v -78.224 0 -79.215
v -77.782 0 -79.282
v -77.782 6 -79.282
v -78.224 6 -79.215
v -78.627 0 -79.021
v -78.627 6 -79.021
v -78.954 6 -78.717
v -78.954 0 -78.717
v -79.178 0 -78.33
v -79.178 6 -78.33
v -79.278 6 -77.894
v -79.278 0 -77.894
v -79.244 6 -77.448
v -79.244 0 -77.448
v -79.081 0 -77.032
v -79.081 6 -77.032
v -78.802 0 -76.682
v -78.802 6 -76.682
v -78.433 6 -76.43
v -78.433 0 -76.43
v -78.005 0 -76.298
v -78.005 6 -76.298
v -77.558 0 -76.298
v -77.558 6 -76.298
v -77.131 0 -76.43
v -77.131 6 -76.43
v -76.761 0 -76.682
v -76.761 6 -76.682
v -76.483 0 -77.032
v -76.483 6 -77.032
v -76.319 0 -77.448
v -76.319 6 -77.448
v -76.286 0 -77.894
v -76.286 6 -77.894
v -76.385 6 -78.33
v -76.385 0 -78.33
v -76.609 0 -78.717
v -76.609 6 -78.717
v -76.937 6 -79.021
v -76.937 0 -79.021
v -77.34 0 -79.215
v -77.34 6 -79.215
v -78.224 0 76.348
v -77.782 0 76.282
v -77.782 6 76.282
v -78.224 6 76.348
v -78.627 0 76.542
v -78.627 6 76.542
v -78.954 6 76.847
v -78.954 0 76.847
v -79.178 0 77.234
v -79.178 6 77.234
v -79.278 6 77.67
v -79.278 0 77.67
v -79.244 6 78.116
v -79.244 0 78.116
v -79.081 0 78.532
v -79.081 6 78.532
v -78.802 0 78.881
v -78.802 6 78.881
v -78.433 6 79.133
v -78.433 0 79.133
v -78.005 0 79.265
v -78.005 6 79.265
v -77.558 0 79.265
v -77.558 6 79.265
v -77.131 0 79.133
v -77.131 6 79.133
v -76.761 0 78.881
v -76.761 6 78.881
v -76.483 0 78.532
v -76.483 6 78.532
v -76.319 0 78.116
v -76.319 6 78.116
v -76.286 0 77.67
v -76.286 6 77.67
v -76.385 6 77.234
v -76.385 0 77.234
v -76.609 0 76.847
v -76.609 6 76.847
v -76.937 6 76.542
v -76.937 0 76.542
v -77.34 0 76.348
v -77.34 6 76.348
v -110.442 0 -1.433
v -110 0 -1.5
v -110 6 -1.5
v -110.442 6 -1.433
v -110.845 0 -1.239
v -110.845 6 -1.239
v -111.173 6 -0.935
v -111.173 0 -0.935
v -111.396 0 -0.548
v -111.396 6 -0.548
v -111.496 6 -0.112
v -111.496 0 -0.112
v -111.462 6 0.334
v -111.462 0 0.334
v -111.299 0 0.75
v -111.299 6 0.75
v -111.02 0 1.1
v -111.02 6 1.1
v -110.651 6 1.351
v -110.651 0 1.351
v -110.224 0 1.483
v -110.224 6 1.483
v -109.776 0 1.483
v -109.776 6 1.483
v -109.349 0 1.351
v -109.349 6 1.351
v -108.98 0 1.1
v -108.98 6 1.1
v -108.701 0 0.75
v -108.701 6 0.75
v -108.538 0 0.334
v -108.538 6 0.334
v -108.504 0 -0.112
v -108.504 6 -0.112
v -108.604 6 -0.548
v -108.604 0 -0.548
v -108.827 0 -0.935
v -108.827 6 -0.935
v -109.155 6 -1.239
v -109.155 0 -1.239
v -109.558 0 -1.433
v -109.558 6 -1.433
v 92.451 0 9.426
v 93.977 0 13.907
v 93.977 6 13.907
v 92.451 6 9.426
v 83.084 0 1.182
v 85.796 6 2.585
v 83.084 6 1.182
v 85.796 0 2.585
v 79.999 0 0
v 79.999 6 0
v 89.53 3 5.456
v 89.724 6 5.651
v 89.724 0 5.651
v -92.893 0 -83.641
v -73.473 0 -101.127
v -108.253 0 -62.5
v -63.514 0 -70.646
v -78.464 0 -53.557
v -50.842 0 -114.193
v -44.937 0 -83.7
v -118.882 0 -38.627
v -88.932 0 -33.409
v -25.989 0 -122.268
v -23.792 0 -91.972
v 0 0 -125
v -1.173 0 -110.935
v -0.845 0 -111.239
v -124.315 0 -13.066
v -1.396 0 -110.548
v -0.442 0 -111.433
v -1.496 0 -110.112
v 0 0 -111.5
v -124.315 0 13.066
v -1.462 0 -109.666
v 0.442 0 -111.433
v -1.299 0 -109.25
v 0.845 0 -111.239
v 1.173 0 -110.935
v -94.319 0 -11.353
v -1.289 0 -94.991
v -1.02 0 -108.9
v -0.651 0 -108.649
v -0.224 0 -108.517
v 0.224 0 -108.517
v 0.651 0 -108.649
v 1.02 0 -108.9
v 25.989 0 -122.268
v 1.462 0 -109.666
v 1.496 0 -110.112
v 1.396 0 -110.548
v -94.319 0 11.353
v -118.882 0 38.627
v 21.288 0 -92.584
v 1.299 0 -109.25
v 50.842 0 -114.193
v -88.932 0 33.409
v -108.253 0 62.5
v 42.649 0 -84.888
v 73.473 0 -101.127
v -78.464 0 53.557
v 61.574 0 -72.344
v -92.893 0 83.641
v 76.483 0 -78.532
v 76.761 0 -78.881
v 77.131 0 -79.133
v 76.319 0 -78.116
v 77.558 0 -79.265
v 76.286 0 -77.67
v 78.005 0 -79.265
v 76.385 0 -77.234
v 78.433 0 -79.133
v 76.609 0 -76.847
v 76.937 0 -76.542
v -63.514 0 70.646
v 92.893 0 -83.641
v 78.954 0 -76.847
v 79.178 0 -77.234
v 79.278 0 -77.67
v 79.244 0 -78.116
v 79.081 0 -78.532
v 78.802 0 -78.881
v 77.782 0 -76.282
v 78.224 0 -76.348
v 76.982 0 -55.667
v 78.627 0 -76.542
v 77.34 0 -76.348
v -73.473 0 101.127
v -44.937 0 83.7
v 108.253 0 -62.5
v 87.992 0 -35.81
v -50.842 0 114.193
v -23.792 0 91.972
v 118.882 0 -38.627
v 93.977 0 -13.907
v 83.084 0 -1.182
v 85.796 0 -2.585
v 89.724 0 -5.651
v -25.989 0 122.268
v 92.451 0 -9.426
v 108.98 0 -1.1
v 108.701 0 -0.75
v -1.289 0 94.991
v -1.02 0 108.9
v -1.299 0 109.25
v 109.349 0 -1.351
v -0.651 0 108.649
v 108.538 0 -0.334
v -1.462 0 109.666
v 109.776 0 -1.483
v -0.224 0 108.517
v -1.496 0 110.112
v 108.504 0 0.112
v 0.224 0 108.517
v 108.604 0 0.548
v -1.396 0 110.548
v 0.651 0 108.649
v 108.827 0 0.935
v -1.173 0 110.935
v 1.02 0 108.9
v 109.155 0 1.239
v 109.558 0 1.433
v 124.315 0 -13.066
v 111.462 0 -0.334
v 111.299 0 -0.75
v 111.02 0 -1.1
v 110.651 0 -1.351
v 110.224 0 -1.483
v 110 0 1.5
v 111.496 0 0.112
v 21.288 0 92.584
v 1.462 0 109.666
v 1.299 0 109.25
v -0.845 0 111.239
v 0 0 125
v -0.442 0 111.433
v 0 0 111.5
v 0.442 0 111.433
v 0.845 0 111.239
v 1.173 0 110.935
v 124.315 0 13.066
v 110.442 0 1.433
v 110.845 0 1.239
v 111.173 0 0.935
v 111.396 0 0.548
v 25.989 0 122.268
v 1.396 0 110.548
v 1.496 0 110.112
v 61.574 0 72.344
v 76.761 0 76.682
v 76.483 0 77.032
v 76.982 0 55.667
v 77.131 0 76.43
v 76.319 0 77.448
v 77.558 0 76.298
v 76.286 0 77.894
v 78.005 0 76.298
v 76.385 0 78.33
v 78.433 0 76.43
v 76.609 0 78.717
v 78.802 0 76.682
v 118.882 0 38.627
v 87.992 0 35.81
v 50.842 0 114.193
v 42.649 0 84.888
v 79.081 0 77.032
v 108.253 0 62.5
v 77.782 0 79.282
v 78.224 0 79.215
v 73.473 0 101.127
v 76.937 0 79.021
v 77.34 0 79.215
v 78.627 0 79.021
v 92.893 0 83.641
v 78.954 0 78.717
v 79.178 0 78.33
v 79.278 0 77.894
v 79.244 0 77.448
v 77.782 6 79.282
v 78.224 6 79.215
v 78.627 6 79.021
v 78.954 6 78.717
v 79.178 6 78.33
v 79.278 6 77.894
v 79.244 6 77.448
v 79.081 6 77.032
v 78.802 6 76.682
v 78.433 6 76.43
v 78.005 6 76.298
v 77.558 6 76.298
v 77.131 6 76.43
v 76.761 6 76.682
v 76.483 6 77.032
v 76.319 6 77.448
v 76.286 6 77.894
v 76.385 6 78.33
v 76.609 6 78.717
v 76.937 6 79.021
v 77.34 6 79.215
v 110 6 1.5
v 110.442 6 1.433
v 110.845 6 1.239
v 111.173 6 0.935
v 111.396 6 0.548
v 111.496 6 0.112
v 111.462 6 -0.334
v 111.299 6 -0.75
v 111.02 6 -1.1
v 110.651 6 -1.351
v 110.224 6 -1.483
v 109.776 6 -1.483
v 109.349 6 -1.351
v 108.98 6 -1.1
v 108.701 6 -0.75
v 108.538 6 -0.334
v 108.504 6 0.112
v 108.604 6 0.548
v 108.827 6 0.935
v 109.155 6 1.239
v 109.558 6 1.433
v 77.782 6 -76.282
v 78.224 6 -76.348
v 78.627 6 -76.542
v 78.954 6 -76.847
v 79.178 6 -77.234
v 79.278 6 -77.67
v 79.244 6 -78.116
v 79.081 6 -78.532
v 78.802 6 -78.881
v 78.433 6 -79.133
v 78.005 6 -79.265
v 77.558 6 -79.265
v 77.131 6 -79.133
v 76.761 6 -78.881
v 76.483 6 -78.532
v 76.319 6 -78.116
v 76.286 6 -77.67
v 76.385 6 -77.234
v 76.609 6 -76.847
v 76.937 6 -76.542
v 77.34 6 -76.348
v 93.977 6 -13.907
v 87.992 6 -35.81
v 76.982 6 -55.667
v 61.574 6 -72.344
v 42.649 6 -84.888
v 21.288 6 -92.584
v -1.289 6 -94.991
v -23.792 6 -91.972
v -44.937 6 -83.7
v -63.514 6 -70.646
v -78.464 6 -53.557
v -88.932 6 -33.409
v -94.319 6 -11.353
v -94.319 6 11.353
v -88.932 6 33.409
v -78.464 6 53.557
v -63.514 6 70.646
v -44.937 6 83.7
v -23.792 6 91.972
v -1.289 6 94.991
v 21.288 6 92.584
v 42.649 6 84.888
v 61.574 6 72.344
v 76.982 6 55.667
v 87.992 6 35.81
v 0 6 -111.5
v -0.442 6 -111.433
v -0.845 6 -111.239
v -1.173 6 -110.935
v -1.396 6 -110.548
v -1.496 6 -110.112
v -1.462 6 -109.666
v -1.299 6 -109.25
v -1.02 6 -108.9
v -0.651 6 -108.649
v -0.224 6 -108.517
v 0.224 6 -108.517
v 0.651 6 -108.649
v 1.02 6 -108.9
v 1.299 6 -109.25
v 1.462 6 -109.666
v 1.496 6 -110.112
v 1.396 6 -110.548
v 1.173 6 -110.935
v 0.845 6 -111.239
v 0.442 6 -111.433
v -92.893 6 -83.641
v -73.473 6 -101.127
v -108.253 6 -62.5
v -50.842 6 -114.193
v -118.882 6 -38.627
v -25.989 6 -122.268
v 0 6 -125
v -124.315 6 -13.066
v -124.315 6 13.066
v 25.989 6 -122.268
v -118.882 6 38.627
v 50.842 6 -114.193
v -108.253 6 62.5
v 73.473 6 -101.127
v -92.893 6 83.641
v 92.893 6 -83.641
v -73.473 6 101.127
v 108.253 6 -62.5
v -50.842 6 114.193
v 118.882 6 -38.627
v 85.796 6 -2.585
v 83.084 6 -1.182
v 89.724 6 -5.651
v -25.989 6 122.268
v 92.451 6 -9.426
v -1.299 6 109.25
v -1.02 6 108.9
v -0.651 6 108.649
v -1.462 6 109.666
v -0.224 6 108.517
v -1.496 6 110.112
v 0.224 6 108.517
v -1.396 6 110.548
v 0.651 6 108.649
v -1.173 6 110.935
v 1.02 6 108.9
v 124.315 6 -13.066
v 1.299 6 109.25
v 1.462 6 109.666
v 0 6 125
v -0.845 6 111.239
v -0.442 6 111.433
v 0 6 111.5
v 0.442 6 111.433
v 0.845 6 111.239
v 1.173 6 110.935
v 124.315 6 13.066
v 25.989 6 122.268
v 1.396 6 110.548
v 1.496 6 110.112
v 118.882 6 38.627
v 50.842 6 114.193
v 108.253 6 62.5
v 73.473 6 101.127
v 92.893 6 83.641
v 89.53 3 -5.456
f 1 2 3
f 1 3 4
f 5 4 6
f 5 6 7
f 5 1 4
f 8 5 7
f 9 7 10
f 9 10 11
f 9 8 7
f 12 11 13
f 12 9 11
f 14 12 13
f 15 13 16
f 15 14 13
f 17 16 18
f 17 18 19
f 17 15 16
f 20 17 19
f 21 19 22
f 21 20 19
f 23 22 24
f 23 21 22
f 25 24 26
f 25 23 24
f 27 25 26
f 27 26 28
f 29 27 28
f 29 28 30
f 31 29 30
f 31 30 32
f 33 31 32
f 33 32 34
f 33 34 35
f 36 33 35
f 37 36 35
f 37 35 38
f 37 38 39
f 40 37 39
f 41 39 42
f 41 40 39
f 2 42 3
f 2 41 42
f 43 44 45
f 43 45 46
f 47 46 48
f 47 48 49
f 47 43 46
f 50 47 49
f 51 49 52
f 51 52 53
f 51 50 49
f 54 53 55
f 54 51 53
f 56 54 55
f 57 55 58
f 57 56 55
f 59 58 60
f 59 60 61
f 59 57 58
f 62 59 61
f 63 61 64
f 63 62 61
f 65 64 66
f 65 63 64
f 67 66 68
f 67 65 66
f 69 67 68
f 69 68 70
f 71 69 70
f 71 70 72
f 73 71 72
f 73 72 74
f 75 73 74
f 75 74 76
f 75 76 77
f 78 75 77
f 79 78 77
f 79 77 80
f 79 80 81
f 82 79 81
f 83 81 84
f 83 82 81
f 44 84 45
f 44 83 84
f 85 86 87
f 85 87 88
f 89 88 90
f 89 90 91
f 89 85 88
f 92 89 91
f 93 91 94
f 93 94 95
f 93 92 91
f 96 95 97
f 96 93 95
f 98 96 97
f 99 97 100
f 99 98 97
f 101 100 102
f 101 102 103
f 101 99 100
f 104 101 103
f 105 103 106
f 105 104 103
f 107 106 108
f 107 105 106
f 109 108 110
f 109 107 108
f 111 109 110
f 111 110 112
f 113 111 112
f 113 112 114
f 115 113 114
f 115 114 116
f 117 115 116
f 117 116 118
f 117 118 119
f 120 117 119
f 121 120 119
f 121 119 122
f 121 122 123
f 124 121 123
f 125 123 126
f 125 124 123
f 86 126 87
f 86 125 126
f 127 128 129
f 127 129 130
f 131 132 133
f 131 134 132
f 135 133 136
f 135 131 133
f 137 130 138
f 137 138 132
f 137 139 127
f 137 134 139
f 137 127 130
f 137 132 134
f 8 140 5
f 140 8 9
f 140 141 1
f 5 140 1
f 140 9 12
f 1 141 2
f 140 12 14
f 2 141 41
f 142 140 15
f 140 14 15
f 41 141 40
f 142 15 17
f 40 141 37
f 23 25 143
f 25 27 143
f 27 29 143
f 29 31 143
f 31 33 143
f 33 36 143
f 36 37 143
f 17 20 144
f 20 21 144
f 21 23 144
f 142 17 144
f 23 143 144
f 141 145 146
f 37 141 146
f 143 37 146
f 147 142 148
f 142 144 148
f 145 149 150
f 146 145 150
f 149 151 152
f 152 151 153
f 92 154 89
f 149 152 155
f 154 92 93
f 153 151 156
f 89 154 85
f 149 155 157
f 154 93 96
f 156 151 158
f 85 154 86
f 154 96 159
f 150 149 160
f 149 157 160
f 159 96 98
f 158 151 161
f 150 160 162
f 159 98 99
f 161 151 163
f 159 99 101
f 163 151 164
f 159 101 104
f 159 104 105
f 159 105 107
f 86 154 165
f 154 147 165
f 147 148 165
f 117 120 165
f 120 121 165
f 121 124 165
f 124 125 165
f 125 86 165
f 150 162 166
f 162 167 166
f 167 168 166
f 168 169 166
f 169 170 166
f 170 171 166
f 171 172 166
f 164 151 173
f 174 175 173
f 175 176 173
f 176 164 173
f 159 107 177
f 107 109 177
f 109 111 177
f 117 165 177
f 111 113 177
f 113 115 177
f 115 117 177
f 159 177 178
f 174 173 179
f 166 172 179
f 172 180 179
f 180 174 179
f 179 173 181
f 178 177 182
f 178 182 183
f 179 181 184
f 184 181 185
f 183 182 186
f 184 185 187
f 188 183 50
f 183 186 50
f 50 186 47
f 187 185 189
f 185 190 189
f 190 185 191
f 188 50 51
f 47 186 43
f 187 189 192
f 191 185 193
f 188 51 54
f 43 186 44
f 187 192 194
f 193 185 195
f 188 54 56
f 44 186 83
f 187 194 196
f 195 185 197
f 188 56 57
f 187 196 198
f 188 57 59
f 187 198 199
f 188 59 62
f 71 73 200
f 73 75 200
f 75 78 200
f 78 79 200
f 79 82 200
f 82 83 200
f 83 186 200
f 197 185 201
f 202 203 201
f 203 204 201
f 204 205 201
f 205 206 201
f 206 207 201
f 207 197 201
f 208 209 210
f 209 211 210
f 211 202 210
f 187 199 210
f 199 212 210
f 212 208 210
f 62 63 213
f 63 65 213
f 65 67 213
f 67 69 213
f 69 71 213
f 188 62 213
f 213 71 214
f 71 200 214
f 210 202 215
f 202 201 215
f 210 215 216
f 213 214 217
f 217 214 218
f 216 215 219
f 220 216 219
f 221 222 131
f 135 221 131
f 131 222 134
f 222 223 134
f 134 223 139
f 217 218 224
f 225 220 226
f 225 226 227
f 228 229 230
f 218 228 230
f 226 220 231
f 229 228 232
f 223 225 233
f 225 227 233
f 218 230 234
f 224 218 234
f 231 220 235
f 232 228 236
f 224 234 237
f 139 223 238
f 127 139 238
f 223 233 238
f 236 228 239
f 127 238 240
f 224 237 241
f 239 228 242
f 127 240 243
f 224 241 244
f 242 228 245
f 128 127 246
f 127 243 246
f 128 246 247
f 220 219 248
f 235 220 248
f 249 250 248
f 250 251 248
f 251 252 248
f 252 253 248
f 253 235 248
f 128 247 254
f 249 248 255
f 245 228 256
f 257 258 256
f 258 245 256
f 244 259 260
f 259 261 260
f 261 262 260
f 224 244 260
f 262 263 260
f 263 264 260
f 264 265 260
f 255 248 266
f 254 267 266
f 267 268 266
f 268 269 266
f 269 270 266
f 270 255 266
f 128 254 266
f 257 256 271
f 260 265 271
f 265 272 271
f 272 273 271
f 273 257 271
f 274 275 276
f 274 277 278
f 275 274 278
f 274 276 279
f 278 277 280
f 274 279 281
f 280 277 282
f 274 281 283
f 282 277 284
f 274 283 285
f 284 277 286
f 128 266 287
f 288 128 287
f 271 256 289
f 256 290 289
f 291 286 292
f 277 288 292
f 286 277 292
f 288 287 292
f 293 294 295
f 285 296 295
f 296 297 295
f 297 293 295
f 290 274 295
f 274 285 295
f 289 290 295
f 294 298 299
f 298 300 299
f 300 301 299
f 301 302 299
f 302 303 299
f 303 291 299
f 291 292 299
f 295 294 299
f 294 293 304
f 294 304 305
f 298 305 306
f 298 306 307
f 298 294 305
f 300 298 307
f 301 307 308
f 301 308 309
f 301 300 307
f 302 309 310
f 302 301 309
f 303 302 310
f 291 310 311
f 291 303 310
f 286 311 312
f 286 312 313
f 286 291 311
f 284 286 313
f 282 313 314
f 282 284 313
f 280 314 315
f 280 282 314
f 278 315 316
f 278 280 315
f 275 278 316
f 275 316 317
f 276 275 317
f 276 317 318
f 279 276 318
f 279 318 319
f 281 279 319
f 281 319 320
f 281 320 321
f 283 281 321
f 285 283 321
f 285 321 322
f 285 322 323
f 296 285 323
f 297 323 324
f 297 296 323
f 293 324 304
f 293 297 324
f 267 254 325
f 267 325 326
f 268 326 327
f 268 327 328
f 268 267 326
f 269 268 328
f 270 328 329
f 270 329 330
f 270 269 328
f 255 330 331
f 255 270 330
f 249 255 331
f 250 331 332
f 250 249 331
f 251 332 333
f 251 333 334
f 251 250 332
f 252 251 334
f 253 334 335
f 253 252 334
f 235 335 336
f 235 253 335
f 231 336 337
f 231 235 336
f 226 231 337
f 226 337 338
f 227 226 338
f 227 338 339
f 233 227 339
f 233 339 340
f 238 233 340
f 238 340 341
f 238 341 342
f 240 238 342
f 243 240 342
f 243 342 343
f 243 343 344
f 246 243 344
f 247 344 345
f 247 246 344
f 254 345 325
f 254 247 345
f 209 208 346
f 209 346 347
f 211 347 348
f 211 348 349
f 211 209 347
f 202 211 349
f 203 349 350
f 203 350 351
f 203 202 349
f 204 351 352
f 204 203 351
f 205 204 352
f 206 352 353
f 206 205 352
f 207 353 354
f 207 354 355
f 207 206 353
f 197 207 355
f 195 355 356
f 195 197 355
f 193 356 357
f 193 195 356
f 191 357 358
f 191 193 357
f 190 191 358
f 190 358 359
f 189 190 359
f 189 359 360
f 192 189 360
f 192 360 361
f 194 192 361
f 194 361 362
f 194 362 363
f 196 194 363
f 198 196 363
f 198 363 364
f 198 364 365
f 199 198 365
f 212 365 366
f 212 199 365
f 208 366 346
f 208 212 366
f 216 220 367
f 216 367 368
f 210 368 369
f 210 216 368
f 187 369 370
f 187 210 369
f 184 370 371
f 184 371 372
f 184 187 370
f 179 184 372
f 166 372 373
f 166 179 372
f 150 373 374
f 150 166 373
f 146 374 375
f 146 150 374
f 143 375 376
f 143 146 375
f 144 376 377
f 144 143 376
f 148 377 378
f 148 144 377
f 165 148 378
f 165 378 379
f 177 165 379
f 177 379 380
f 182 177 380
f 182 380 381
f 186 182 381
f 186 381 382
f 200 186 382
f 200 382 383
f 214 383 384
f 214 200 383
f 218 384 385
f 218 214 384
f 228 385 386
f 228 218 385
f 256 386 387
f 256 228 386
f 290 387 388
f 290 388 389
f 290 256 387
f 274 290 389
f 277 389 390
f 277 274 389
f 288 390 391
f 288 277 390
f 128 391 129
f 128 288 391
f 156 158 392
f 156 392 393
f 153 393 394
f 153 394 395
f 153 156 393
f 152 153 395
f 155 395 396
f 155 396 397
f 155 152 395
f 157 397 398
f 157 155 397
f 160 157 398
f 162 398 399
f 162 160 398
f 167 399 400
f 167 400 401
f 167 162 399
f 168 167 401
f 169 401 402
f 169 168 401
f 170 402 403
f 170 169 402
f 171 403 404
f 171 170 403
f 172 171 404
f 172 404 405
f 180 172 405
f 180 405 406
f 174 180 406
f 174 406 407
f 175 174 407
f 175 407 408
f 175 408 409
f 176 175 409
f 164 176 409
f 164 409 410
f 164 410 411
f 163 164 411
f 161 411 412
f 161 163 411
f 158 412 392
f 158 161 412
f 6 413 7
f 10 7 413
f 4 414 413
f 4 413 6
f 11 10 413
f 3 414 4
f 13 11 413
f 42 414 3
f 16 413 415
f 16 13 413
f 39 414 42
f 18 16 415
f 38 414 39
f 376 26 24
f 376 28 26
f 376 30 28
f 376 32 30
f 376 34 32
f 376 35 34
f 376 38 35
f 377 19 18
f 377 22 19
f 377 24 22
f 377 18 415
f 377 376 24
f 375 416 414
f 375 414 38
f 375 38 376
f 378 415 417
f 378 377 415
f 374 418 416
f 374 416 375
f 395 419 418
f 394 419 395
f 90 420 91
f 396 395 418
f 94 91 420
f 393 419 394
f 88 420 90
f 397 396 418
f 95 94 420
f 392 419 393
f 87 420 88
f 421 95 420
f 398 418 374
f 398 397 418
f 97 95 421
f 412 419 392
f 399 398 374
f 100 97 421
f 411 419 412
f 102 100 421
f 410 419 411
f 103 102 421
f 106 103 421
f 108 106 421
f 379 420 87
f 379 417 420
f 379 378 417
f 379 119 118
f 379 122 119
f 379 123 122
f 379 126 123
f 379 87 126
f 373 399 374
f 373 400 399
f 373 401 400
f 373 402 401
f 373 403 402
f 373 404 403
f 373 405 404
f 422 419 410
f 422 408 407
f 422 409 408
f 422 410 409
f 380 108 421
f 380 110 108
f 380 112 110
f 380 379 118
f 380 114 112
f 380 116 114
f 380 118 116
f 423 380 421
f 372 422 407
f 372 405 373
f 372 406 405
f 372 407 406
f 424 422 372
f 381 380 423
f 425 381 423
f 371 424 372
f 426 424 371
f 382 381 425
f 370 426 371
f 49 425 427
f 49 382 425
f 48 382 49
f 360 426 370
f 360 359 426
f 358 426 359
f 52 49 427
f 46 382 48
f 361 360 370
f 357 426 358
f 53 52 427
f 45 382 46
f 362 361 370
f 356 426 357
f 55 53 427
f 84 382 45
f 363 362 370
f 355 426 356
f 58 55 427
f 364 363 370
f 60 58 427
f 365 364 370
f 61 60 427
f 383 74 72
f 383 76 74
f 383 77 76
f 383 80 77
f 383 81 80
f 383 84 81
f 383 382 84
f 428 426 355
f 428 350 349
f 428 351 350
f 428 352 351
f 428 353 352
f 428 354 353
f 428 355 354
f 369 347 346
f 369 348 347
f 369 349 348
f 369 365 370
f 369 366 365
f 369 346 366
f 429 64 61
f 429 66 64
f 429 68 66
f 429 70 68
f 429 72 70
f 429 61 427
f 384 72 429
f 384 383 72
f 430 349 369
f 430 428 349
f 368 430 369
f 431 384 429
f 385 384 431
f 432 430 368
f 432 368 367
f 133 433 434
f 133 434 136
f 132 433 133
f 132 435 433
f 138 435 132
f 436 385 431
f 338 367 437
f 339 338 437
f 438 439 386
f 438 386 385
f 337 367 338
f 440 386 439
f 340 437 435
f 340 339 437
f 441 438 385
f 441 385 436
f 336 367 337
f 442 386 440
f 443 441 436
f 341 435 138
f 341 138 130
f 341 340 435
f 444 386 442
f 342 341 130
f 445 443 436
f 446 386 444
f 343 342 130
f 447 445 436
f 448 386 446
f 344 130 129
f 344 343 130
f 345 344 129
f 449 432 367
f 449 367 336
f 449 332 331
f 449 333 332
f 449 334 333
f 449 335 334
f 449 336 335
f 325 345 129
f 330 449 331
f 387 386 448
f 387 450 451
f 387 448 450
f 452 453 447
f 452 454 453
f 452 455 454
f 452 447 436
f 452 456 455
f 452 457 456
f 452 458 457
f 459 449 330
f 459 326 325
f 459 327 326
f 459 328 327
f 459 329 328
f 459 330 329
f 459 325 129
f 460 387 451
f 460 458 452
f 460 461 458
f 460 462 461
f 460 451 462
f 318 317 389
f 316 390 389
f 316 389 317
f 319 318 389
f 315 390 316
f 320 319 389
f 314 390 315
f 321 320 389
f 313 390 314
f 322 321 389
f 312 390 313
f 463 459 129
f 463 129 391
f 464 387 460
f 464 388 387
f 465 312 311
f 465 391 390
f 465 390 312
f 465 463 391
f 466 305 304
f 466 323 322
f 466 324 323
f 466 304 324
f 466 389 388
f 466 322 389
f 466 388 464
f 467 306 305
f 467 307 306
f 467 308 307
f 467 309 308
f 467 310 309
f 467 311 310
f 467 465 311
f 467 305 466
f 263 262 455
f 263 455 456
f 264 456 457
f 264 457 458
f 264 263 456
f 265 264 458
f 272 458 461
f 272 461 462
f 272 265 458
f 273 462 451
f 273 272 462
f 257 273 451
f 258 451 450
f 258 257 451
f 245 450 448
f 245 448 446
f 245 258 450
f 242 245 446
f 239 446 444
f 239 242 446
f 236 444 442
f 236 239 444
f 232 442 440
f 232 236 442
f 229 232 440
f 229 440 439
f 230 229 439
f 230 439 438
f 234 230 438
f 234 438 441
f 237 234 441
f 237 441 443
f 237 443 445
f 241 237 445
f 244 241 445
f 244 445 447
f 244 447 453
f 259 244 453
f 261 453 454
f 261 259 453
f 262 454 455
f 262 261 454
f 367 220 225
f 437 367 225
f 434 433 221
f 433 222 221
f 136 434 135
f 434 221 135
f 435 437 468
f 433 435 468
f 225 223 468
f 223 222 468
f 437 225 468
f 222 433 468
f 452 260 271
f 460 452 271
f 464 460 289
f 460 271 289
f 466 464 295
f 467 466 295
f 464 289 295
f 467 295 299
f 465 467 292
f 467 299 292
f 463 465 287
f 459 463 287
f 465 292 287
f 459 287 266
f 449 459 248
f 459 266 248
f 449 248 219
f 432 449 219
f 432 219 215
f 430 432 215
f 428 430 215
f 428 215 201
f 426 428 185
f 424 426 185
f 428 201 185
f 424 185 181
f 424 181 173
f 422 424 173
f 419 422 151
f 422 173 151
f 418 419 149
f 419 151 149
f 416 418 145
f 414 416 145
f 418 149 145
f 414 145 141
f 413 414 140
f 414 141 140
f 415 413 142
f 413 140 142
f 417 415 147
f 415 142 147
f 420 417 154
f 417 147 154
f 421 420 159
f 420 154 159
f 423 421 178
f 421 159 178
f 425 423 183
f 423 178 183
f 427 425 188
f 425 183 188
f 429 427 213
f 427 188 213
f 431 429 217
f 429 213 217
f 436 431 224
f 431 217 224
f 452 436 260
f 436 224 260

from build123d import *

# Parameters (mm, degrees)
SKETCH1_R           = 125
SKETCH1_R_2         = 1.5
BOSS_EXTRUDE1_DEPTH = 6


with BuildPart() as part:
    # Sketch1 → Boss-Extrude1 (new body)
    with BuildSketch(Plane(origin=(0, 0, 0), x_dir=(1, 0, 0), z_dir=(0, 1, 0))):
        Circle(SKETCH1_R)
        with Locations((0, -110)):
            Circle(SKETCH1_R_2, mode=Mode.SUBTRACT)
        with Locations((77.781745931, -77.781745931)):
            Circle(SKETCH1_R_2, mode=Mode.SUBTRACT)
        with Locations((110, 0)):
            Circle(SKETCH1_R_2, mode=Mode.SUBTRACT)
        with Locations((77.781745931, 77.781745931)):
            Circle(SKETCH1_R_2, mode=Mode.SUBTRACT)
        with Locations((0, 110)):
            Circle(SKETCH1_R_2, mode=Mode.SUBTRACT)
        with Locations((-77.781745931, 77.781745931)):
            Circle(SKETCH1_R_2, mode=Mode.SUBTRACT)
        with Locations((-110, 0)):
            Circle(SKETCH1_R_2, mode=Mode.SUBTRACT)
        with Locations((-77.781745931, -77.781745931)):
            Circle(SKETCH1_R_2, mode=Mode.SUBTRACT)
        with BuildLine():
            ThreePointArc((93.976500469, 13.907456977), (-95, 0), (93.976500469, -13.907456977))
            add(Edge.make_bspline(
                [(93.976500469, -13.907456977), (92.072801417, -3.957394346), (79.998651047, 0)],
                knots=[0, 0, 0, 1, 1, 1], degree=2))
            add(Edge.make_bspline(
                [(93.976500469, 13.907456977), (92.072801417, 3.957394346), (79.998651047, 0)],
                knots=[0, 0, 0, 1, 1, 1], degree=2))
        make_face(mode=Mode.SUBTRACT)
    extrude(amount=BOSS_EXTRUDE1_DEPTH)


solid = part.part
